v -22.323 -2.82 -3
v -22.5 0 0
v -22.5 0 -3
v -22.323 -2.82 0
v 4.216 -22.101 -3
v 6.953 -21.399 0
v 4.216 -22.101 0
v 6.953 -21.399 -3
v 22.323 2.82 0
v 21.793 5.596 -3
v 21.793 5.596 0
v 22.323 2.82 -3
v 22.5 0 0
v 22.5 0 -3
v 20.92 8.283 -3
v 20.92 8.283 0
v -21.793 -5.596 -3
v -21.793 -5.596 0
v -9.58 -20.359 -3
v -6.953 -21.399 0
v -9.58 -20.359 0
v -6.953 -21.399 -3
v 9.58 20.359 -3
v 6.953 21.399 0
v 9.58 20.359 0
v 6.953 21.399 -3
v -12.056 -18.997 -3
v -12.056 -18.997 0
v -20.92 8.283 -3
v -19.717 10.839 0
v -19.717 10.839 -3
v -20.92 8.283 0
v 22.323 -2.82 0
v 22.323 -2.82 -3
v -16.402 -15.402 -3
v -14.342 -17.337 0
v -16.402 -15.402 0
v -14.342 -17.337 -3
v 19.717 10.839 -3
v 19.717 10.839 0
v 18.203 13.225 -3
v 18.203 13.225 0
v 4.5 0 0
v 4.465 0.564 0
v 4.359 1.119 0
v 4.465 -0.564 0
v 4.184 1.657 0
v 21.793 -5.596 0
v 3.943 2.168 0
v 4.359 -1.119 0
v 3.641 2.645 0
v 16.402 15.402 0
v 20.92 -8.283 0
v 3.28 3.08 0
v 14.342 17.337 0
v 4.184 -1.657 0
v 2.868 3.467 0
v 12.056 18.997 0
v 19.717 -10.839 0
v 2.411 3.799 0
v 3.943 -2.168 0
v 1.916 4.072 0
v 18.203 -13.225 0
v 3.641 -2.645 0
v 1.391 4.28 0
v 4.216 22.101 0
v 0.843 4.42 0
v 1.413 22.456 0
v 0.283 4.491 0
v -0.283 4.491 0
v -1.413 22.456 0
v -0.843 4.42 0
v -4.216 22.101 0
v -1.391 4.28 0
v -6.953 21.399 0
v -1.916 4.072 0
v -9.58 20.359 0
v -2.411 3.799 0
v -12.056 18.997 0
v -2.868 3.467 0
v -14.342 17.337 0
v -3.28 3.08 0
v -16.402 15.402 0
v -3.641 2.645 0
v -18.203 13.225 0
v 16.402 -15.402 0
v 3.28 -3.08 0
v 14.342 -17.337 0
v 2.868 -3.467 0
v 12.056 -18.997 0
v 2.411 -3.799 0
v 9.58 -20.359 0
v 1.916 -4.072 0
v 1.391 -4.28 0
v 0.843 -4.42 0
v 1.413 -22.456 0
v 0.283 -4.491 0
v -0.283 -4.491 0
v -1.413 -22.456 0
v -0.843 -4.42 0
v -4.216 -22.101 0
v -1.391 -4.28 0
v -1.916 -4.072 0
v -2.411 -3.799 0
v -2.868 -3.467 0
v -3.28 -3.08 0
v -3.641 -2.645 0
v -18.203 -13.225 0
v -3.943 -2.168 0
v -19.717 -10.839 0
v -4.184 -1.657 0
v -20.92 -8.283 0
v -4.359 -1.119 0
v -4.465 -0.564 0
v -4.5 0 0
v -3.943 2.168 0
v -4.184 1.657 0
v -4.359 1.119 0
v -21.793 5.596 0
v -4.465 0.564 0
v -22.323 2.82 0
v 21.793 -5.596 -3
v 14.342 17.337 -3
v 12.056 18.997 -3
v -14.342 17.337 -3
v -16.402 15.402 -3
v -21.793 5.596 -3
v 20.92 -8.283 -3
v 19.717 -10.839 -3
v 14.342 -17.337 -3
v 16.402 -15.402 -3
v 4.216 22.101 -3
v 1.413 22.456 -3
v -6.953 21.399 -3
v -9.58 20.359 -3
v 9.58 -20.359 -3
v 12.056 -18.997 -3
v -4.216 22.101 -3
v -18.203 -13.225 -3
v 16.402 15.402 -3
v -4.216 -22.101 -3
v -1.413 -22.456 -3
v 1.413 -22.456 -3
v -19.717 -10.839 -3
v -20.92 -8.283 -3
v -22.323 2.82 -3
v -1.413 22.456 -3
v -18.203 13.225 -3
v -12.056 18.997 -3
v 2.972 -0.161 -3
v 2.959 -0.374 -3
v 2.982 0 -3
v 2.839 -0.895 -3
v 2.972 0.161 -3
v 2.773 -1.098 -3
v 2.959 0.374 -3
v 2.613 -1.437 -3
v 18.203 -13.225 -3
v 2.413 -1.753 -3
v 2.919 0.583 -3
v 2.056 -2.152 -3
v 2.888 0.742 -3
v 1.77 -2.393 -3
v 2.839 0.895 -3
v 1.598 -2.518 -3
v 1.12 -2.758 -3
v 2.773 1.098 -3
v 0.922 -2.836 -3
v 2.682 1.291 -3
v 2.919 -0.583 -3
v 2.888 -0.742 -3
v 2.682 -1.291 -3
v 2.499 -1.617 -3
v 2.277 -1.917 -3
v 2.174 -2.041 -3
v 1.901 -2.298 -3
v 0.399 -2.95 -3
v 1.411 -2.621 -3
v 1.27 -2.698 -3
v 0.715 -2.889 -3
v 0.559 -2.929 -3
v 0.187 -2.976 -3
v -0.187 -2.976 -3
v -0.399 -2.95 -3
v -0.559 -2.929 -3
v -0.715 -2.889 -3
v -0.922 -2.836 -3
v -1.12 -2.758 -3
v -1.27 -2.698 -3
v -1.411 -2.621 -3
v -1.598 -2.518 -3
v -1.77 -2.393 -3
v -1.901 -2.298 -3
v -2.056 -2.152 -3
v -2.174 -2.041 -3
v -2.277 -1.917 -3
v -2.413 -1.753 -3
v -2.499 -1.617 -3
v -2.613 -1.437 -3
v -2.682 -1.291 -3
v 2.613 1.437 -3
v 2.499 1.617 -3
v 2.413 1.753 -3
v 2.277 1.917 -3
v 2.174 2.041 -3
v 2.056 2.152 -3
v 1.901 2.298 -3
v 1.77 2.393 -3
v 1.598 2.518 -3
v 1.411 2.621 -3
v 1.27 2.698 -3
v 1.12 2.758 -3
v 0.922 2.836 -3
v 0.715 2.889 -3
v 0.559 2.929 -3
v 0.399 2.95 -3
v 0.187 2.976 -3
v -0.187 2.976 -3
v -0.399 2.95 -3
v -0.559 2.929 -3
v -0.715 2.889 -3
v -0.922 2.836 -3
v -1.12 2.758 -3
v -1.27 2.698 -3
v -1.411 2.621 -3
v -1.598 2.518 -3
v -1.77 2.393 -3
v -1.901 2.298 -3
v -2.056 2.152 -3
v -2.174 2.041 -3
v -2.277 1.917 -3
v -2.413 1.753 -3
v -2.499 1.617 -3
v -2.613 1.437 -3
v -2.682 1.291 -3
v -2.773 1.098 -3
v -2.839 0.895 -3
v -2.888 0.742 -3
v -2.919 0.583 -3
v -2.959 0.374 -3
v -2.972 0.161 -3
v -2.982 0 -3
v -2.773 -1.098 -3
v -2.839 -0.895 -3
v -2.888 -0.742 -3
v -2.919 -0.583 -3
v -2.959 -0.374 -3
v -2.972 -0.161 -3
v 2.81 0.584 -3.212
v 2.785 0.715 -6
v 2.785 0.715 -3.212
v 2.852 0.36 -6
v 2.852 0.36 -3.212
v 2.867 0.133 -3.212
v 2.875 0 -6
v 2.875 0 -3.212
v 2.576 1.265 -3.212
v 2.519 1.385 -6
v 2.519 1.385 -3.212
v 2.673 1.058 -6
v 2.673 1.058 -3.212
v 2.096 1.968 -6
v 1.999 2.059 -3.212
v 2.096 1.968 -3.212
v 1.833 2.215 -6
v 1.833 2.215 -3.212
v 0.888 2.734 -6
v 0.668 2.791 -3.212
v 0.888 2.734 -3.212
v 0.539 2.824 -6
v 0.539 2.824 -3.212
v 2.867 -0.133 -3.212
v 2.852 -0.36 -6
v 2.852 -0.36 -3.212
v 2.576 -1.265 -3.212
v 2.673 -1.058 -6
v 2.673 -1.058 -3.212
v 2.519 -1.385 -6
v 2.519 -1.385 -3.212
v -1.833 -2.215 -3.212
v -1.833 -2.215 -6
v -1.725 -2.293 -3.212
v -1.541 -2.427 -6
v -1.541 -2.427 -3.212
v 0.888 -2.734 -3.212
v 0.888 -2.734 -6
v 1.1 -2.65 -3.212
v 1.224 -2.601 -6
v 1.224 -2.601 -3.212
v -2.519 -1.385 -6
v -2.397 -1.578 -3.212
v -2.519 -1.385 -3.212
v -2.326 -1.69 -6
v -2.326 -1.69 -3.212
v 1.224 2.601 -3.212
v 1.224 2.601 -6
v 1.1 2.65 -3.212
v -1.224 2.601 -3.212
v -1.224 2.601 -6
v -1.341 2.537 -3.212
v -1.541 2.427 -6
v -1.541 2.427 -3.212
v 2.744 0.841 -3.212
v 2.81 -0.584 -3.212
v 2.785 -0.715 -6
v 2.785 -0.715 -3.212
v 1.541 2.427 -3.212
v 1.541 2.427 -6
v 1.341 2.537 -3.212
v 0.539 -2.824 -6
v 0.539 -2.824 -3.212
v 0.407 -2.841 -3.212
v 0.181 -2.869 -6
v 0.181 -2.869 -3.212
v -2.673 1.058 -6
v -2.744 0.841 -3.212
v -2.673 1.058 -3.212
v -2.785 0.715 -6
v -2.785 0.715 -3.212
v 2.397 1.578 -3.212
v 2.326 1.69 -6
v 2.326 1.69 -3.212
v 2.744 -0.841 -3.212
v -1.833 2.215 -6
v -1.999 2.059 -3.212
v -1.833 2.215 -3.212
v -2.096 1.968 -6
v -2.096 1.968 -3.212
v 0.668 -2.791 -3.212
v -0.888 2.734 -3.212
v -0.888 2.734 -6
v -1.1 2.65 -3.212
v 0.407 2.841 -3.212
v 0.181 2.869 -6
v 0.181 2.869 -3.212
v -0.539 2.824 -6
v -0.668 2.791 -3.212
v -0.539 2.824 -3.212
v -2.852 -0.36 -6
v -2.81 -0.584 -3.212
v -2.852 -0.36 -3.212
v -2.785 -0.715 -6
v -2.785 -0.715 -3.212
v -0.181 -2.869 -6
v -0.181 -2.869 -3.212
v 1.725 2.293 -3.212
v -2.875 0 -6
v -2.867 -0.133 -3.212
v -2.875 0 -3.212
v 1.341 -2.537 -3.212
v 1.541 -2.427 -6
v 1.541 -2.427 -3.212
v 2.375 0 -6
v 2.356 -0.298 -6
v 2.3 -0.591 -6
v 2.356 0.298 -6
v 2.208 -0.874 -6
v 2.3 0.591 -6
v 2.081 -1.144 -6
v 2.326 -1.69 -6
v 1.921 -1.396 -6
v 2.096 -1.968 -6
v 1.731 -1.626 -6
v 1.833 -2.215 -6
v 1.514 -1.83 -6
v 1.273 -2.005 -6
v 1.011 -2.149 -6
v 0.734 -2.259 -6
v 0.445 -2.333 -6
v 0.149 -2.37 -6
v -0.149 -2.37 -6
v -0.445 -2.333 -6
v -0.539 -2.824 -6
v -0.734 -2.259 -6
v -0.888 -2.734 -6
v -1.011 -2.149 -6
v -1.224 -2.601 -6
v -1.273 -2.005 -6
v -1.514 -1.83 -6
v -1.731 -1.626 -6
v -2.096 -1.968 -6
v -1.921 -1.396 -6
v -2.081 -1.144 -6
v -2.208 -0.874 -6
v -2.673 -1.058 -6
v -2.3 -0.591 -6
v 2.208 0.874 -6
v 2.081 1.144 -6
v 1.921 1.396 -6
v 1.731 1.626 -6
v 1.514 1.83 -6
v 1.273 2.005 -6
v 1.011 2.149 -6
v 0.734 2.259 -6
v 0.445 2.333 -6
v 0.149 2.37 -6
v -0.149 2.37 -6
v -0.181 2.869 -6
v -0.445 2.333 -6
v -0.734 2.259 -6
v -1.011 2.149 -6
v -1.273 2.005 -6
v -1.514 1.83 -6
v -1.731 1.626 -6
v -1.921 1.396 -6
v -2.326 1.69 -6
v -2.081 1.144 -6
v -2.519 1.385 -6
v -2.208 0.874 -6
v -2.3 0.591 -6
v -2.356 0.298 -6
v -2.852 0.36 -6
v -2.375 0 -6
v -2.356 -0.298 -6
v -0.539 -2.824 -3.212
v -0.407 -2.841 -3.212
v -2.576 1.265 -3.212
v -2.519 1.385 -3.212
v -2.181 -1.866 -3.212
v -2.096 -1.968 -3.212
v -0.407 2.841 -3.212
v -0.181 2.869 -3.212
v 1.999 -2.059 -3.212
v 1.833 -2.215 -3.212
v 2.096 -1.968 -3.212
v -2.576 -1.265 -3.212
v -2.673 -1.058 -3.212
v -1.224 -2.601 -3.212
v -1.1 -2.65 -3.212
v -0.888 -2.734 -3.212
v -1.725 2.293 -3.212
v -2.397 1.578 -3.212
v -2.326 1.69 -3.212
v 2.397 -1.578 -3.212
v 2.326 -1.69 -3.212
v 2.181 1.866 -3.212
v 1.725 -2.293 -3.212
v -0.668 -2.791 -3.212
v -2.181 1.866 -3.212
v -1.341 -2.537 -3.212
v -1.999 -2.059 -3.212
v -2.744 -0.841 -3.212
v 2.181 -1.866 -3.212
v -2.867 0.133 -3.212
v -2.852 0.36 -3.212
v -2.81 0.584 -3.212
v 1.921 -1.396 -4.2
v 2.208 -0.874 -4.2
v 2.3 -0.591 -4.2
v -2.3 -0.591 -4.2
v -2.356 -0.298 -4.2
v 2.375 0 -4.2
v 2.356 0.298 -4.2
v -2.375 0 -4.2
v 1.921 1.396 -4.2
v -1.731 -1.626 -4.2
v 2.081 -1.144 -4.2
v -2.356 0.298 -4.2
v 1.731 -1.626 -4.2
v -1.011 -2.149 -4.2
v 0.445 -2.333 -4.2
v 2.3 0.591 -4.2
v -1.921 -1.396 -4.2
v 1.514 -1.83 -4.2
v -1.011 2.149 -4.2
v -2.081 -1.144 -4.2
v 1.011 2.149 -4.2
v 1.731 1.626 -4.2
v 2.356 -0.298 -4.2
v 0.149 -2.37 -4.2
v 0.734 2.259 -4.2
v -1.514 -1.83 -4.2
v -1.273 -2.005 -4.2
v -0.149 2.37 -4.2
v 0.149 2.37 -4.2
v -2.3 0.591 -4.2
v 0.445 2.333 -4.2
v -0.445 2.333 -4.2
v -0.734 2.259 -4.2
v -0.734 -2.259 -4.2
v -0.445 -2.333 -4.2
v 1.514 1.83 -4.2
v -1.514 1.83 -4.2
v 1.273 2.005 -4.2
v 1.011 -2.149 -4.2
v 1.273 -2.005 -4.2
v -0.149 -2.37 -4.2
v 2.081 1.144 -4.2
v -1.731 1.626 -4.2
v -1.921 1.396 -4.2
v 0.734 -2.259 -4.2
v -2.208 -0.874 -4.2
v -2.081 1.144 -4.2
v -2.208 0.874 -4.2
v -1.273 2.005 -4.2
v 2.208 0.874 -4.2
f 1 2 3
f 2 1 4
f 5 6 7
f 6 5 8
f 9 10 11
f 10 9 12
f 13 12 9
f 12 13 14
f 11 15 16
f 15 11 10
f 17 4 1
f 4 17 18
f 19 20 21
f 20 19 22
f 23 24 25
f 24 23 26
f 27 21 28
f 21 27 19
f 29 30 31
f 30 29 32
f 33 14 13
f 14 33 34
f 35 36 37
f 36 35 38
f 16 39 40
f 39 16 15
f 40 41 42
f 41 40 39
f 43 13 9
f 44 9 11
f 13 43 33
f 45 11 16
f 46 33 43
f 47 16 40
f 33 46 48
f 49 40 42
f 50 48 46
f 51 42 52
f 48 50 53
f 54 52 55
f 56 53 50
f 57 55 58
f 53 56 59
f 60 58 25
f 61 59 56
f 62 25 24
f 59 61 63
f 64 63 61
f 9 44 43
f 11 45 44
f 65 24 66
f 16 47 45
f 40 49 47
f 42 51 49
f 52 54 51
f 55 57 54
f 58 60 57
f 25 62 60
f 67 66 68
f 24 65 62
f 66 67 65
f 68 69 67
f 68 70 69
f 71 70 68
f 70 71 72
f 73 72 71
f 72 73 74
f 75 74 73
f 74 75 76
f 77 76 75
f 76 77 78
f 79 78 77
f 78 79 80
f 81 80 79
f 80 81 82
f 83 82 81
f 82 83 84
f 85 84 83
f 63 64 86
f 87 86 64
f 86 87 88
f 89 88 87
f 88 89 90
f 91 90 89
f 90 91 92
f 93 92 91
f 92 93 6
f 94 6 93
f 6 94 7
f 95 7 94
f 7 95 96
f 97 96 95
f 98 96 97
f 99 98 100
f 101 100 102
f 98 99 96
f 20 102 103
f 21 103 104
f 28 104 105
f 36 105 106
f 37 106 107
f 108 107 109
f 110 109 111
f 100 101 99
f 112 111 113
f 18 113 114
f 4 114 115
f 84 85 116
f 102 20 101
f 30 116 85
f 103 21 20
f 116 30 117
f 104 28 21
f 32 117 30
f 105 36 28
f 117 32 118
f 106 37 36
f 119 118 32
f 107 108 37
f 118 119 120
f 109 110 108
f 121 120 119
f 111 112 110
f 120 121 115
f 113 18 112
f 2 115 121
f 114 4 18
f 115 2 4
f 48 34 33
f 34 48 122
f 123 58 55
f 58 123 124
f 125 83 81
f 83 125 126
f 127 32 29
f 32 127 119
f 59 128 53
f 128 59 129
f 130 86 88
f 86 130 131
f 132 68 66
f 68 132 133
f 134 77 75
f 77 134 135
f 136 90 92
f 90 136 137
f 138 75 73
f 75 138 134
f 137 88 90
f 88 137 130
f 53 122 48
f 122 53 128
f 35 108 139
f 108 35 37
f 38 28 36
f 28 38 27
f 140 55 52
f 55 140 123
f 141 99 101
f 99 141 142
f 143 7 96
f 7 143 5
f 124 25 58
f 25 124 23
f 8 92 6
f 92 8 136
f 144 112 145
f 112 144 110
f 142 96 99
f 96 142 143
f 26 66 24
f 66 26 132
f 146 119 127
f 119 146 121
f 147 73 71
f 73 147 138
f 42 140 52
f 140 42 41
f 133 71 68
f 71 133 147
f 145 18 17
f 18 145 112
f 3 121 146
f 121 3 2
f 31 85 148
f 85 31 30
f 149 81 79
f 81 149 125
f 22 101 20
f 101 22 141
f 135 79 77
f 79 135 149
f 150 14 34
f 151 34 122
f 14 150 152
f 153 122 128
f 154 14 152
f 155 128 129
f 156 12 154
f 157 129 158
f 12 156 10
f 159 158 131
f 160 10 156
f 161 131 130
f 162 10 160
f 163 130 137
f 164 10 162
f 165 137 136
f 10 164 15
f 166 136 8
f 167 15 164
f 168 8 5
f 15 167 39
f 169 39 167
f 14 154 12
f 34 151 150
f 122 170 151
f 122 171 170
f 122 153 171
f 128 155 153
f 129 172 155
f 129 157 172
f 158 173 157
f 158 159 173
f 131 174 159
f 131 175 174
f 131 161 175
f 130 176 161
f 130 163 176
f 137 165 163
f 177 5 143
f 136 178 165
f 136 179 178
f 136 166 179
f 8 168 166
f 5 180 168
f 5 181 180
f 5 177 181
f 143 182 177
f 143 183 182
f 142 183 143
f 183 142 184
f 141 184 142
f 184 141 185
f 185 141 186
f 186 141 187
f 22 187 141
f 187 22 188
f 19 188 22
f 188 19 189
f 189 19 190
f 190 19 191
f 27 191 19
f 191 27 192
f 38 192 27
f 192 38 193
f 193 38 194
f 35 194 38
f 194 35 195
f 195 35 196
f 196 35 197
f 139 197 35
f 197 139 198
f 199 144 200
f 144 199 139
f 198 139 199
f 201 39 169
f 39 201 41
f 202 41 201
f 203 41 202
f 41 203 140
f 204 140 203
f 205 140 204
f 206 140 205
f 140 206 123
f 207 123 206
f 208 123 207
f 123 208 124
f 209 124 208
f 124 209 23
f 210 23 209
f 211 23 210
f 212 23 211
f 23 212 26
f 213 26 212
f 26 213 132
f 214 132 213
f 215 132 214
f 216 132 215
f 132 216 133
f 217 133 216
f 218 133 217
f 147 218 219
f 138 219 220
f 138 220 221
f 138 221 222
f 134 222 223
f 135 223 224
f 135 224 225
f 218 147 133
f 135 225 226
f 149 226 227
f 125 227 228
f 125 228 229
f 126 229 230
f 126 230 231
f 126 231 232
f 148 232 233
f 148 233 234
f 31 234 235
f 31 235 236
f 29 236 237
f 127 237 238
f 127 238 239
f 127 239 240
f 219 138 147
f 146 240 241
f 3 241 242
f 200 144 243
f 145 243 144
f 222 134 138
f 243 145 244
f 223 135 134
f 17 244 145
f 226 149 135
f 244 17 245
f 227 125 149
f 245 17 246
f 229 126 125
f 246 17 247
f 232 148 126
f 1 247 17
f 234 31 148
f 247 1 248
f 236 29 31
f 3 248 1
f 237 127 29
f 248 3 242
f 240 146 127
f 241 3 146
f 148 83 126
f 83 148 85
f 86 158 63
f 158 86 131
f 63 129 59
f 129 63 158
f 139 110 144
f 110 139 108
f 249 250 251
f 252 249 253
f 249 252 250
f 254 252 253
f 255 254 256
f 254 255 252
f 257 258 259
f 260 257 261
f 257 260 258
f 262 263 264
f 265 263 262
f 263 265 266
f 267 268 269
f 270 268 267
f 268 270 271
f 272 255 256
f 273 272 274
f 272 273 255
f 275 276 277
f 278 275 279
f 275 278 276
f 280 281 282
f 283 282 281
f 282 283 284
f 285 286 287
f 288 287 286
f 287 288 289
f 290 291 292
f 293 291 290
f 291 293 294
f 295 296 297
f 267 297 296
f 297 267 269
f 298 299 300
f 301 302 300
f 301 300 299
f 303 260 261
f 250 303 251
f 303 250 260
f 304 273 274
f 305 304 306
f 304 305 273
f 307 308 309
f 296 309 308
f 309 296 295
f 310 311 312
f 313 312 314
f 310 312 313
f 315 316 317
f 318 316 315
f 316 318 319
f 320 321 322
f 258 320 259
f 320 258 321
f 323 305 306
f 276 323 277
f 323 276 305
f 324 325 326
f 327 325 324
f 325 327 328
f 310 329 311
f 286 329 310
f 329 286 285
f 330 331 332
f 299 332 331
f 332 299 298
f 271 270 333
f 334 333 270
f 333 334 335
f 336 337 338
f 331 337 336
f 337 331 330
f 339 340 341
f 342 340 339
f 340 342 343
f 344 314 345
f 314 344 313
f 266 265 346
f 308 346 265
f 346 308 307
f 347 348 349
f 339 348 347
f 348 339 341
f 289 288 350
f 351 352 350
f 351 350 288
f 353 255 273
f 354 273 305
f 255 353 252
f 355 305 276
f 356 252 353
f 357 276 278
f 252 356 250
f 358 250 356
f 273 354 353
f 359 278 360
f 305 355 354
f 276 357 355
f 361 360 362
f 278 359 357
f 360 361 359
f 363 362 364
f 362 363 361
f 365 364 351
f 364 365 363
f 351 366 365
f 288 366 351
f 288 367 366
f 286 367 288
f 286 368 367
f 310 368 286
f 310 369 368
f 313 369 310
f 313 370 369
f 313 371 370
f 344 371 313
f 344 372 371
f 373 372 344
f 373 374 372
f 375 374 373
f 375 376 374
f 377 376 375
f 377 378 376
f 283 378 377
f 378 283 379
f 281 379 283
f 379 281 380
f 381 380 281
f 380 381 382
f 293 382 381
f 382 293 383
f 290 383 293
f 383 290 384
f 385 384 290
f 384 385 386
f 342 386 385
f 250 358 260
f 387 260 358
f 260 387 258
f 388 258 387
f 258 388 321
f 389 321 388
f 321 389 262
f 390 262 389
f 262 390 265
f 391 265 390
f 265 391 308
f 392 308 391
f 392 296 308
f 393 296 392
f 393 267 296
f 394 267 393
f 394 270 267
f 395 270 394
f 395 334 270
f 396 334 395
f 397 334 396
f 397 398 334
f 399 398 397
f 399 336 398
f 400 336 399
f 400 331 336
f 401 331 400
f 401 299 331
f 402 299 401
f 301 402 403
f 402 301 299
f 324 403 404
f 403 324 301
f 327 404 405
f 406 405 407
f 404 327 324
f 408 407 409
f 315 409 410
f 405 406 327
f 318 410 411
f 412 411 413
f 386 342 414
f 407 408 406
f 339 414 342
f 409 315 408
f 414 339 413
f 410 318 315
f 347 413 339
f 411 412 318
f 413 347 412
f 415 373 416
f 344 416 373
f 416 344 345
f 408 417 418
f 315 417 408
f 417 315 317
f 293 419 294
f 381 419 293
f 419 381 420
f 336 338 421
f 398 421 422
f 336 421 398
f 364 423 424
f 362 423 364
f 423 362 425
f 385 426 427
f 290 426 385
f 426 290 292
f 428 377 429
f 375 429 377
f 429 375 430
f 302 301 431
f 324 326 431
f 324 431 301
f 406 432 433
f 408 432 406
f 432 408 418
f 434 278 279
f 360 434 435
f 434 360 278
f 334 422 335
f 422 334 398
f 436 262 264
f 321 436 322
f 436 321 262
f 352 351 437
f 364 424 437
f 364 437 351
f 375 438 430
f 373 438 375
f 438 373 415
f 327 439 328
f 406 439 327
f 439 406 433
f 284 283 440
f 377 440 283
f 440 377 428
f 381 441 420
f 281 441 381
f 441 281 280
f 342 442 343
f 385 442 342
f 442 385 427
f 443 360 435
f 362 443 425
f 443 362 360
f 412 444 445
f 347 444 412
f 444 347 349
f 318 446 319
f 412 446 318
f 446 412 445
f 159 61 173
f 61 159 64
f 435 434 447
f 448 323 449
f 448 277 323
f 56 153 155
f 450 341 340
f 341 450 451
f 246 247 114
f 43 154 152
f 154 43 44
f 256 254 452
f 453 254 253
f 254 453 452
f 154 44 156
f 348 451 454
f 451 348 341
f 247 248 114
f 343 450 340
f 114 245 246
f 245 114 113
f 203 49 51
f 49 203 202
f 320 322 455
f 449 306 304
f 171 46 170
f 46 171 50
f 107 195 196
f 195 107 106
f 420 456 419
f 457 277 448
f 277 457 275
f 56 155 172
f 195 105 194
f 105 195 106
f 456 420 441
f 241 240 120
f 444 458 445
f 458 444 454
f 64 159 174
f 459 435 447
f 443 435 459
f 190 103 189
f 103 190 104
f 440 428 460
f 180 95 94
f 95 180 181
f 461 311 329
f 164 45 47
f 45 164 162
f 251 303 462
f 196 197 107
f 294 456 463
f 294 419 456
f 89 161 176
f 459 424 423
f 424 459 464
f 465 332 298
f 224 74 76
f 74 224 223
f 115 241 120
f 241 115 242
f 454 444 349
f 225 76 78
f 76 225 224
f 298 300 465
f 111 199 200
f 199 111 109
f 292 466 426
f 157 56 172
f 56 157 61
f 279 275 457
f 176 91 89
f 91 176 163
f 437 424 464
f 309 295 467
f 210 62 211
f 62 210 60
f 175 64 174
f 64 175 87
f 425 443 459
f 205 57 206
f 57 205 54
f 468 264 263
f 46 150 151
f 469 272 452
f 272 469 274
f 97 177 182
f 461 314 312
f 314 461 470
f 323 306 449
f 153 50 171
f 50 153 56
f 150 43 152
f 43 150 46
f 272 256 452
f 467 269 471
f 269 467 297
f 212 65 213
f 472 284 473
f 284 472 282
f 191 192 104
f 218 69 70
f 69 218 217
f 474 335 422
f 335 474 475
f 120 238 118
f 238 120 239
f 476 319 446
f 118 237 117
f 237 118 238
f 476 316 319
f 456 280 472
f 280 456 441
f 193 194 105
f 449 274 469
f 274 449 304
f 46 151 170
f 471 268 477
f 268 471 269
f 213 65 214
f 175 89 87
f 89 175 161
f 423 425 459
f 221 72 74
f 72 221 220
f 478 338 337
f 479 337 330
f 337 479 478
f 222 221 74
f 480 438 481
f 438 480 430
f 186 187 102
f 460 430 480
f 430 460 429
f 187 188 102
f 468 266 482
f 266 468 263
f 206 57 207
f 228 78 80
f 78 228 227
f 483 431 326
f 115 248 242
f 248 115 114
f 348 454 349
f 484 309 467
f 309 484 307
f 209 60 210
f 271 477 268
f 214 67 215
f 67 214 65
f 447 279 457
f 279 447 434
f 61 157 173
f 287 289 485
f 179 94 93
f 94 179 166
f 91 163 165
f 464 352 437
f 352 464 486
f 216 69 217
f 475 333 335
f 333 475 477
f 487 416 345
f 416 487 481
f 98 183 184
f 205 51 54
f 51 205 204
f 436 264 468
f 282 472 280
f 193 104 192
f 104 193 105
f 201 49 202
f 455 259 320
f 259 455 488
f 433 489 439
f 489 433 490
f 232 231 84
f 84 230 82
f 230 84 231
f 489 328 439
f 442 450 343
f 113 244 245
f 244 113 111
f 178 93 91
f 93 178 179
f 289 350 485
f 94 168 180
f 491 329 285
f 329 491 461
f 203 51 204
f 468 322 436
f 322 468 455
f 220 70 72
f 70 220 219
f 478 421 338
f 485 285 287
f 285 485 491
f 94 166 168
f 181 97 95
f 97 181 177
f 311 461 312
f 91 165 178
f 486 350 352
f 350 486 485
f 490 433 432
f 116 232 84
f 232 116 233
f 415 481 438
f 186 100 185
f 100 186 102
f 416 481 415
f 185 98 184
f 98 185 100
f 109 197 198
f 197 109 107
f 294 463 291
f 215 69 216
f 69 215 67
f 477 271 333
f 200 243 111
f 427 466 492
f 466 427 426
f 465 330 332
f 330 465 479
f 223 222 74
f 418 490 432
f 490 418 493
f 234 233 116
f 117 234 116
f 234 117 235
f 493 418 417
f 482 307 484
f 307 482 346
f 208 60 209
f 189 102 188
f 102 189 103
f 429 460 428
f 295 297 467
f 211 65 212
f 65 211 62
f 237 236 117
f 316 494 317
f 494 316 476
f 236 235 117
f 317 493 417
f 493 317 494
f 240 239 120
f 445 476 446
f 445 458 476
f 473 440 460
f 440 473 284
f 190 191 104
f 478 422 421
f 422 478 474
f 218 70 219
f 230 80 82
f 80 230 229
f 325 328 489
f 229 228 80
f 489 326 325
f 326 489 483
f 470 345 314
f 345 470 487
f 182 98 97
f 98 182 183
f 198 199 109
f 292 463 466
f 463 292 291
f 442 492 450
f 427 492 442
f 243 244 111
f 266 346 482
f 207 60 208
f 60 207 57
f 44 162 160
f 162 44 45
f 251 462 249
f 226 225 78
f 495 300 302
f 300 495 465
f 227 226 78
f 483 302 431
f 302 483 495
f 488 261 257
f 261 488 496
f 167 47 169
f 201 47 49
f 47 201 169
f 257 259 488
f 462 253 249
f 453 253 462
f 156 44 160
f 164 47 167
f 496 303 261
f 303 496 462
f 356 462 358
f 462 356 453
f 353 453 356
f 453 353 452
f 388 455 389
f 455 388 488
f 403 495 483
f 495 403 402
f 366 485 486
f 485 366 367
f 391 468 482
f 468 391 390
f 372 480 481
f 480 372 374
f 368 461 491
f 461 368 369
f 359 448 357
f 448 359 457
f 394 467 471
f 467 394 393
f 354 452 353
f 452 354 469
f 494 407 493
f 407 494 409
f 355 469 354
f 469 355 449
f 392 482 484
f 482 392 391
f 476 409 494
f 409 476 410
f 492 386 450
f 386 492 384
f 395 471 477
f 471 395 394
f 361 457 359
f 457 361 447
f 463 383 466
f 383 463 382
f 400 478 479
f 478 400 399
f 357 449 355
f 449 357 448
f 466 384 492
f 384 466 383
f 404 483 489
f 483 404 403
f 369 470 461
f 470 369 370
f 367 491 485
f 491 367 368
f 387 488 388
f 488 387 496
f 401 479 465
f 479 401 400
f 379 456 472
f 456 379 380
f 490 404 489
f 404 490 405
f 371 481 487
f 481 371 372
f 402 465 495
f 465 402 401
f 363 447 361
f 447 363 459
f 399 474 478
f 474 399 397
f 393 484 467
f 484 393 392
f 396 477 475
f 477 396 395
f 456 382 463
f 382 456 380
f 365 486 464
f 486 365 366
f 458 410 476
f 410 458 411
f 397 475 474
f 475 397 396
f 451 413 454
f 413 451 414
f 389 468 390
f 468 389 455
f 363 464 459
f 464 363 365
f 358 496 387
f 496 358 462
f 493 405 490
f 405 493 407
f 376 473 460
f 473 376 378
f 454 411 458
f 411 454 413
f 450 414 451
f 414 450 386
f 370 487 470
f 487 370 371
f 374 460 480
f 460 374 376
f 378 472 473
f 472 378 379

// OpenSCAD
$fn = 50;

difference() {
	union() {
		translate(v = [0, 0, -3.0]) {
			cylinder(h = 3, r = 22.5);
		}
		#translate(v = [0, 0, -6.0]) {
			cylinder(h = 6, r = 2.875);
		}
	}
	union() {
		translate(v = [0, 0, 0]) {
			rotate(a = [0, 0, 0]) {
				difference() {
					union() {
						translate(v = [0, 0, -6.0]) {
							cylinder(h = 6, r = 2.25);
						}
						translate(v = [0, 0, -4.2]) {
							cylinder(h = 4.2, r1 = 2.375, r2 = 4.5);
						}
						translate(v = [0, 0, -6.0]) {
							cylinder(h = 6, r = 2.375);
						}
						translate(v = [0, 0, -6.0]) {
							cylinder(h = 6, r = 2.25);
						}
					}
					union();
				}
			}
		}
	}
}
